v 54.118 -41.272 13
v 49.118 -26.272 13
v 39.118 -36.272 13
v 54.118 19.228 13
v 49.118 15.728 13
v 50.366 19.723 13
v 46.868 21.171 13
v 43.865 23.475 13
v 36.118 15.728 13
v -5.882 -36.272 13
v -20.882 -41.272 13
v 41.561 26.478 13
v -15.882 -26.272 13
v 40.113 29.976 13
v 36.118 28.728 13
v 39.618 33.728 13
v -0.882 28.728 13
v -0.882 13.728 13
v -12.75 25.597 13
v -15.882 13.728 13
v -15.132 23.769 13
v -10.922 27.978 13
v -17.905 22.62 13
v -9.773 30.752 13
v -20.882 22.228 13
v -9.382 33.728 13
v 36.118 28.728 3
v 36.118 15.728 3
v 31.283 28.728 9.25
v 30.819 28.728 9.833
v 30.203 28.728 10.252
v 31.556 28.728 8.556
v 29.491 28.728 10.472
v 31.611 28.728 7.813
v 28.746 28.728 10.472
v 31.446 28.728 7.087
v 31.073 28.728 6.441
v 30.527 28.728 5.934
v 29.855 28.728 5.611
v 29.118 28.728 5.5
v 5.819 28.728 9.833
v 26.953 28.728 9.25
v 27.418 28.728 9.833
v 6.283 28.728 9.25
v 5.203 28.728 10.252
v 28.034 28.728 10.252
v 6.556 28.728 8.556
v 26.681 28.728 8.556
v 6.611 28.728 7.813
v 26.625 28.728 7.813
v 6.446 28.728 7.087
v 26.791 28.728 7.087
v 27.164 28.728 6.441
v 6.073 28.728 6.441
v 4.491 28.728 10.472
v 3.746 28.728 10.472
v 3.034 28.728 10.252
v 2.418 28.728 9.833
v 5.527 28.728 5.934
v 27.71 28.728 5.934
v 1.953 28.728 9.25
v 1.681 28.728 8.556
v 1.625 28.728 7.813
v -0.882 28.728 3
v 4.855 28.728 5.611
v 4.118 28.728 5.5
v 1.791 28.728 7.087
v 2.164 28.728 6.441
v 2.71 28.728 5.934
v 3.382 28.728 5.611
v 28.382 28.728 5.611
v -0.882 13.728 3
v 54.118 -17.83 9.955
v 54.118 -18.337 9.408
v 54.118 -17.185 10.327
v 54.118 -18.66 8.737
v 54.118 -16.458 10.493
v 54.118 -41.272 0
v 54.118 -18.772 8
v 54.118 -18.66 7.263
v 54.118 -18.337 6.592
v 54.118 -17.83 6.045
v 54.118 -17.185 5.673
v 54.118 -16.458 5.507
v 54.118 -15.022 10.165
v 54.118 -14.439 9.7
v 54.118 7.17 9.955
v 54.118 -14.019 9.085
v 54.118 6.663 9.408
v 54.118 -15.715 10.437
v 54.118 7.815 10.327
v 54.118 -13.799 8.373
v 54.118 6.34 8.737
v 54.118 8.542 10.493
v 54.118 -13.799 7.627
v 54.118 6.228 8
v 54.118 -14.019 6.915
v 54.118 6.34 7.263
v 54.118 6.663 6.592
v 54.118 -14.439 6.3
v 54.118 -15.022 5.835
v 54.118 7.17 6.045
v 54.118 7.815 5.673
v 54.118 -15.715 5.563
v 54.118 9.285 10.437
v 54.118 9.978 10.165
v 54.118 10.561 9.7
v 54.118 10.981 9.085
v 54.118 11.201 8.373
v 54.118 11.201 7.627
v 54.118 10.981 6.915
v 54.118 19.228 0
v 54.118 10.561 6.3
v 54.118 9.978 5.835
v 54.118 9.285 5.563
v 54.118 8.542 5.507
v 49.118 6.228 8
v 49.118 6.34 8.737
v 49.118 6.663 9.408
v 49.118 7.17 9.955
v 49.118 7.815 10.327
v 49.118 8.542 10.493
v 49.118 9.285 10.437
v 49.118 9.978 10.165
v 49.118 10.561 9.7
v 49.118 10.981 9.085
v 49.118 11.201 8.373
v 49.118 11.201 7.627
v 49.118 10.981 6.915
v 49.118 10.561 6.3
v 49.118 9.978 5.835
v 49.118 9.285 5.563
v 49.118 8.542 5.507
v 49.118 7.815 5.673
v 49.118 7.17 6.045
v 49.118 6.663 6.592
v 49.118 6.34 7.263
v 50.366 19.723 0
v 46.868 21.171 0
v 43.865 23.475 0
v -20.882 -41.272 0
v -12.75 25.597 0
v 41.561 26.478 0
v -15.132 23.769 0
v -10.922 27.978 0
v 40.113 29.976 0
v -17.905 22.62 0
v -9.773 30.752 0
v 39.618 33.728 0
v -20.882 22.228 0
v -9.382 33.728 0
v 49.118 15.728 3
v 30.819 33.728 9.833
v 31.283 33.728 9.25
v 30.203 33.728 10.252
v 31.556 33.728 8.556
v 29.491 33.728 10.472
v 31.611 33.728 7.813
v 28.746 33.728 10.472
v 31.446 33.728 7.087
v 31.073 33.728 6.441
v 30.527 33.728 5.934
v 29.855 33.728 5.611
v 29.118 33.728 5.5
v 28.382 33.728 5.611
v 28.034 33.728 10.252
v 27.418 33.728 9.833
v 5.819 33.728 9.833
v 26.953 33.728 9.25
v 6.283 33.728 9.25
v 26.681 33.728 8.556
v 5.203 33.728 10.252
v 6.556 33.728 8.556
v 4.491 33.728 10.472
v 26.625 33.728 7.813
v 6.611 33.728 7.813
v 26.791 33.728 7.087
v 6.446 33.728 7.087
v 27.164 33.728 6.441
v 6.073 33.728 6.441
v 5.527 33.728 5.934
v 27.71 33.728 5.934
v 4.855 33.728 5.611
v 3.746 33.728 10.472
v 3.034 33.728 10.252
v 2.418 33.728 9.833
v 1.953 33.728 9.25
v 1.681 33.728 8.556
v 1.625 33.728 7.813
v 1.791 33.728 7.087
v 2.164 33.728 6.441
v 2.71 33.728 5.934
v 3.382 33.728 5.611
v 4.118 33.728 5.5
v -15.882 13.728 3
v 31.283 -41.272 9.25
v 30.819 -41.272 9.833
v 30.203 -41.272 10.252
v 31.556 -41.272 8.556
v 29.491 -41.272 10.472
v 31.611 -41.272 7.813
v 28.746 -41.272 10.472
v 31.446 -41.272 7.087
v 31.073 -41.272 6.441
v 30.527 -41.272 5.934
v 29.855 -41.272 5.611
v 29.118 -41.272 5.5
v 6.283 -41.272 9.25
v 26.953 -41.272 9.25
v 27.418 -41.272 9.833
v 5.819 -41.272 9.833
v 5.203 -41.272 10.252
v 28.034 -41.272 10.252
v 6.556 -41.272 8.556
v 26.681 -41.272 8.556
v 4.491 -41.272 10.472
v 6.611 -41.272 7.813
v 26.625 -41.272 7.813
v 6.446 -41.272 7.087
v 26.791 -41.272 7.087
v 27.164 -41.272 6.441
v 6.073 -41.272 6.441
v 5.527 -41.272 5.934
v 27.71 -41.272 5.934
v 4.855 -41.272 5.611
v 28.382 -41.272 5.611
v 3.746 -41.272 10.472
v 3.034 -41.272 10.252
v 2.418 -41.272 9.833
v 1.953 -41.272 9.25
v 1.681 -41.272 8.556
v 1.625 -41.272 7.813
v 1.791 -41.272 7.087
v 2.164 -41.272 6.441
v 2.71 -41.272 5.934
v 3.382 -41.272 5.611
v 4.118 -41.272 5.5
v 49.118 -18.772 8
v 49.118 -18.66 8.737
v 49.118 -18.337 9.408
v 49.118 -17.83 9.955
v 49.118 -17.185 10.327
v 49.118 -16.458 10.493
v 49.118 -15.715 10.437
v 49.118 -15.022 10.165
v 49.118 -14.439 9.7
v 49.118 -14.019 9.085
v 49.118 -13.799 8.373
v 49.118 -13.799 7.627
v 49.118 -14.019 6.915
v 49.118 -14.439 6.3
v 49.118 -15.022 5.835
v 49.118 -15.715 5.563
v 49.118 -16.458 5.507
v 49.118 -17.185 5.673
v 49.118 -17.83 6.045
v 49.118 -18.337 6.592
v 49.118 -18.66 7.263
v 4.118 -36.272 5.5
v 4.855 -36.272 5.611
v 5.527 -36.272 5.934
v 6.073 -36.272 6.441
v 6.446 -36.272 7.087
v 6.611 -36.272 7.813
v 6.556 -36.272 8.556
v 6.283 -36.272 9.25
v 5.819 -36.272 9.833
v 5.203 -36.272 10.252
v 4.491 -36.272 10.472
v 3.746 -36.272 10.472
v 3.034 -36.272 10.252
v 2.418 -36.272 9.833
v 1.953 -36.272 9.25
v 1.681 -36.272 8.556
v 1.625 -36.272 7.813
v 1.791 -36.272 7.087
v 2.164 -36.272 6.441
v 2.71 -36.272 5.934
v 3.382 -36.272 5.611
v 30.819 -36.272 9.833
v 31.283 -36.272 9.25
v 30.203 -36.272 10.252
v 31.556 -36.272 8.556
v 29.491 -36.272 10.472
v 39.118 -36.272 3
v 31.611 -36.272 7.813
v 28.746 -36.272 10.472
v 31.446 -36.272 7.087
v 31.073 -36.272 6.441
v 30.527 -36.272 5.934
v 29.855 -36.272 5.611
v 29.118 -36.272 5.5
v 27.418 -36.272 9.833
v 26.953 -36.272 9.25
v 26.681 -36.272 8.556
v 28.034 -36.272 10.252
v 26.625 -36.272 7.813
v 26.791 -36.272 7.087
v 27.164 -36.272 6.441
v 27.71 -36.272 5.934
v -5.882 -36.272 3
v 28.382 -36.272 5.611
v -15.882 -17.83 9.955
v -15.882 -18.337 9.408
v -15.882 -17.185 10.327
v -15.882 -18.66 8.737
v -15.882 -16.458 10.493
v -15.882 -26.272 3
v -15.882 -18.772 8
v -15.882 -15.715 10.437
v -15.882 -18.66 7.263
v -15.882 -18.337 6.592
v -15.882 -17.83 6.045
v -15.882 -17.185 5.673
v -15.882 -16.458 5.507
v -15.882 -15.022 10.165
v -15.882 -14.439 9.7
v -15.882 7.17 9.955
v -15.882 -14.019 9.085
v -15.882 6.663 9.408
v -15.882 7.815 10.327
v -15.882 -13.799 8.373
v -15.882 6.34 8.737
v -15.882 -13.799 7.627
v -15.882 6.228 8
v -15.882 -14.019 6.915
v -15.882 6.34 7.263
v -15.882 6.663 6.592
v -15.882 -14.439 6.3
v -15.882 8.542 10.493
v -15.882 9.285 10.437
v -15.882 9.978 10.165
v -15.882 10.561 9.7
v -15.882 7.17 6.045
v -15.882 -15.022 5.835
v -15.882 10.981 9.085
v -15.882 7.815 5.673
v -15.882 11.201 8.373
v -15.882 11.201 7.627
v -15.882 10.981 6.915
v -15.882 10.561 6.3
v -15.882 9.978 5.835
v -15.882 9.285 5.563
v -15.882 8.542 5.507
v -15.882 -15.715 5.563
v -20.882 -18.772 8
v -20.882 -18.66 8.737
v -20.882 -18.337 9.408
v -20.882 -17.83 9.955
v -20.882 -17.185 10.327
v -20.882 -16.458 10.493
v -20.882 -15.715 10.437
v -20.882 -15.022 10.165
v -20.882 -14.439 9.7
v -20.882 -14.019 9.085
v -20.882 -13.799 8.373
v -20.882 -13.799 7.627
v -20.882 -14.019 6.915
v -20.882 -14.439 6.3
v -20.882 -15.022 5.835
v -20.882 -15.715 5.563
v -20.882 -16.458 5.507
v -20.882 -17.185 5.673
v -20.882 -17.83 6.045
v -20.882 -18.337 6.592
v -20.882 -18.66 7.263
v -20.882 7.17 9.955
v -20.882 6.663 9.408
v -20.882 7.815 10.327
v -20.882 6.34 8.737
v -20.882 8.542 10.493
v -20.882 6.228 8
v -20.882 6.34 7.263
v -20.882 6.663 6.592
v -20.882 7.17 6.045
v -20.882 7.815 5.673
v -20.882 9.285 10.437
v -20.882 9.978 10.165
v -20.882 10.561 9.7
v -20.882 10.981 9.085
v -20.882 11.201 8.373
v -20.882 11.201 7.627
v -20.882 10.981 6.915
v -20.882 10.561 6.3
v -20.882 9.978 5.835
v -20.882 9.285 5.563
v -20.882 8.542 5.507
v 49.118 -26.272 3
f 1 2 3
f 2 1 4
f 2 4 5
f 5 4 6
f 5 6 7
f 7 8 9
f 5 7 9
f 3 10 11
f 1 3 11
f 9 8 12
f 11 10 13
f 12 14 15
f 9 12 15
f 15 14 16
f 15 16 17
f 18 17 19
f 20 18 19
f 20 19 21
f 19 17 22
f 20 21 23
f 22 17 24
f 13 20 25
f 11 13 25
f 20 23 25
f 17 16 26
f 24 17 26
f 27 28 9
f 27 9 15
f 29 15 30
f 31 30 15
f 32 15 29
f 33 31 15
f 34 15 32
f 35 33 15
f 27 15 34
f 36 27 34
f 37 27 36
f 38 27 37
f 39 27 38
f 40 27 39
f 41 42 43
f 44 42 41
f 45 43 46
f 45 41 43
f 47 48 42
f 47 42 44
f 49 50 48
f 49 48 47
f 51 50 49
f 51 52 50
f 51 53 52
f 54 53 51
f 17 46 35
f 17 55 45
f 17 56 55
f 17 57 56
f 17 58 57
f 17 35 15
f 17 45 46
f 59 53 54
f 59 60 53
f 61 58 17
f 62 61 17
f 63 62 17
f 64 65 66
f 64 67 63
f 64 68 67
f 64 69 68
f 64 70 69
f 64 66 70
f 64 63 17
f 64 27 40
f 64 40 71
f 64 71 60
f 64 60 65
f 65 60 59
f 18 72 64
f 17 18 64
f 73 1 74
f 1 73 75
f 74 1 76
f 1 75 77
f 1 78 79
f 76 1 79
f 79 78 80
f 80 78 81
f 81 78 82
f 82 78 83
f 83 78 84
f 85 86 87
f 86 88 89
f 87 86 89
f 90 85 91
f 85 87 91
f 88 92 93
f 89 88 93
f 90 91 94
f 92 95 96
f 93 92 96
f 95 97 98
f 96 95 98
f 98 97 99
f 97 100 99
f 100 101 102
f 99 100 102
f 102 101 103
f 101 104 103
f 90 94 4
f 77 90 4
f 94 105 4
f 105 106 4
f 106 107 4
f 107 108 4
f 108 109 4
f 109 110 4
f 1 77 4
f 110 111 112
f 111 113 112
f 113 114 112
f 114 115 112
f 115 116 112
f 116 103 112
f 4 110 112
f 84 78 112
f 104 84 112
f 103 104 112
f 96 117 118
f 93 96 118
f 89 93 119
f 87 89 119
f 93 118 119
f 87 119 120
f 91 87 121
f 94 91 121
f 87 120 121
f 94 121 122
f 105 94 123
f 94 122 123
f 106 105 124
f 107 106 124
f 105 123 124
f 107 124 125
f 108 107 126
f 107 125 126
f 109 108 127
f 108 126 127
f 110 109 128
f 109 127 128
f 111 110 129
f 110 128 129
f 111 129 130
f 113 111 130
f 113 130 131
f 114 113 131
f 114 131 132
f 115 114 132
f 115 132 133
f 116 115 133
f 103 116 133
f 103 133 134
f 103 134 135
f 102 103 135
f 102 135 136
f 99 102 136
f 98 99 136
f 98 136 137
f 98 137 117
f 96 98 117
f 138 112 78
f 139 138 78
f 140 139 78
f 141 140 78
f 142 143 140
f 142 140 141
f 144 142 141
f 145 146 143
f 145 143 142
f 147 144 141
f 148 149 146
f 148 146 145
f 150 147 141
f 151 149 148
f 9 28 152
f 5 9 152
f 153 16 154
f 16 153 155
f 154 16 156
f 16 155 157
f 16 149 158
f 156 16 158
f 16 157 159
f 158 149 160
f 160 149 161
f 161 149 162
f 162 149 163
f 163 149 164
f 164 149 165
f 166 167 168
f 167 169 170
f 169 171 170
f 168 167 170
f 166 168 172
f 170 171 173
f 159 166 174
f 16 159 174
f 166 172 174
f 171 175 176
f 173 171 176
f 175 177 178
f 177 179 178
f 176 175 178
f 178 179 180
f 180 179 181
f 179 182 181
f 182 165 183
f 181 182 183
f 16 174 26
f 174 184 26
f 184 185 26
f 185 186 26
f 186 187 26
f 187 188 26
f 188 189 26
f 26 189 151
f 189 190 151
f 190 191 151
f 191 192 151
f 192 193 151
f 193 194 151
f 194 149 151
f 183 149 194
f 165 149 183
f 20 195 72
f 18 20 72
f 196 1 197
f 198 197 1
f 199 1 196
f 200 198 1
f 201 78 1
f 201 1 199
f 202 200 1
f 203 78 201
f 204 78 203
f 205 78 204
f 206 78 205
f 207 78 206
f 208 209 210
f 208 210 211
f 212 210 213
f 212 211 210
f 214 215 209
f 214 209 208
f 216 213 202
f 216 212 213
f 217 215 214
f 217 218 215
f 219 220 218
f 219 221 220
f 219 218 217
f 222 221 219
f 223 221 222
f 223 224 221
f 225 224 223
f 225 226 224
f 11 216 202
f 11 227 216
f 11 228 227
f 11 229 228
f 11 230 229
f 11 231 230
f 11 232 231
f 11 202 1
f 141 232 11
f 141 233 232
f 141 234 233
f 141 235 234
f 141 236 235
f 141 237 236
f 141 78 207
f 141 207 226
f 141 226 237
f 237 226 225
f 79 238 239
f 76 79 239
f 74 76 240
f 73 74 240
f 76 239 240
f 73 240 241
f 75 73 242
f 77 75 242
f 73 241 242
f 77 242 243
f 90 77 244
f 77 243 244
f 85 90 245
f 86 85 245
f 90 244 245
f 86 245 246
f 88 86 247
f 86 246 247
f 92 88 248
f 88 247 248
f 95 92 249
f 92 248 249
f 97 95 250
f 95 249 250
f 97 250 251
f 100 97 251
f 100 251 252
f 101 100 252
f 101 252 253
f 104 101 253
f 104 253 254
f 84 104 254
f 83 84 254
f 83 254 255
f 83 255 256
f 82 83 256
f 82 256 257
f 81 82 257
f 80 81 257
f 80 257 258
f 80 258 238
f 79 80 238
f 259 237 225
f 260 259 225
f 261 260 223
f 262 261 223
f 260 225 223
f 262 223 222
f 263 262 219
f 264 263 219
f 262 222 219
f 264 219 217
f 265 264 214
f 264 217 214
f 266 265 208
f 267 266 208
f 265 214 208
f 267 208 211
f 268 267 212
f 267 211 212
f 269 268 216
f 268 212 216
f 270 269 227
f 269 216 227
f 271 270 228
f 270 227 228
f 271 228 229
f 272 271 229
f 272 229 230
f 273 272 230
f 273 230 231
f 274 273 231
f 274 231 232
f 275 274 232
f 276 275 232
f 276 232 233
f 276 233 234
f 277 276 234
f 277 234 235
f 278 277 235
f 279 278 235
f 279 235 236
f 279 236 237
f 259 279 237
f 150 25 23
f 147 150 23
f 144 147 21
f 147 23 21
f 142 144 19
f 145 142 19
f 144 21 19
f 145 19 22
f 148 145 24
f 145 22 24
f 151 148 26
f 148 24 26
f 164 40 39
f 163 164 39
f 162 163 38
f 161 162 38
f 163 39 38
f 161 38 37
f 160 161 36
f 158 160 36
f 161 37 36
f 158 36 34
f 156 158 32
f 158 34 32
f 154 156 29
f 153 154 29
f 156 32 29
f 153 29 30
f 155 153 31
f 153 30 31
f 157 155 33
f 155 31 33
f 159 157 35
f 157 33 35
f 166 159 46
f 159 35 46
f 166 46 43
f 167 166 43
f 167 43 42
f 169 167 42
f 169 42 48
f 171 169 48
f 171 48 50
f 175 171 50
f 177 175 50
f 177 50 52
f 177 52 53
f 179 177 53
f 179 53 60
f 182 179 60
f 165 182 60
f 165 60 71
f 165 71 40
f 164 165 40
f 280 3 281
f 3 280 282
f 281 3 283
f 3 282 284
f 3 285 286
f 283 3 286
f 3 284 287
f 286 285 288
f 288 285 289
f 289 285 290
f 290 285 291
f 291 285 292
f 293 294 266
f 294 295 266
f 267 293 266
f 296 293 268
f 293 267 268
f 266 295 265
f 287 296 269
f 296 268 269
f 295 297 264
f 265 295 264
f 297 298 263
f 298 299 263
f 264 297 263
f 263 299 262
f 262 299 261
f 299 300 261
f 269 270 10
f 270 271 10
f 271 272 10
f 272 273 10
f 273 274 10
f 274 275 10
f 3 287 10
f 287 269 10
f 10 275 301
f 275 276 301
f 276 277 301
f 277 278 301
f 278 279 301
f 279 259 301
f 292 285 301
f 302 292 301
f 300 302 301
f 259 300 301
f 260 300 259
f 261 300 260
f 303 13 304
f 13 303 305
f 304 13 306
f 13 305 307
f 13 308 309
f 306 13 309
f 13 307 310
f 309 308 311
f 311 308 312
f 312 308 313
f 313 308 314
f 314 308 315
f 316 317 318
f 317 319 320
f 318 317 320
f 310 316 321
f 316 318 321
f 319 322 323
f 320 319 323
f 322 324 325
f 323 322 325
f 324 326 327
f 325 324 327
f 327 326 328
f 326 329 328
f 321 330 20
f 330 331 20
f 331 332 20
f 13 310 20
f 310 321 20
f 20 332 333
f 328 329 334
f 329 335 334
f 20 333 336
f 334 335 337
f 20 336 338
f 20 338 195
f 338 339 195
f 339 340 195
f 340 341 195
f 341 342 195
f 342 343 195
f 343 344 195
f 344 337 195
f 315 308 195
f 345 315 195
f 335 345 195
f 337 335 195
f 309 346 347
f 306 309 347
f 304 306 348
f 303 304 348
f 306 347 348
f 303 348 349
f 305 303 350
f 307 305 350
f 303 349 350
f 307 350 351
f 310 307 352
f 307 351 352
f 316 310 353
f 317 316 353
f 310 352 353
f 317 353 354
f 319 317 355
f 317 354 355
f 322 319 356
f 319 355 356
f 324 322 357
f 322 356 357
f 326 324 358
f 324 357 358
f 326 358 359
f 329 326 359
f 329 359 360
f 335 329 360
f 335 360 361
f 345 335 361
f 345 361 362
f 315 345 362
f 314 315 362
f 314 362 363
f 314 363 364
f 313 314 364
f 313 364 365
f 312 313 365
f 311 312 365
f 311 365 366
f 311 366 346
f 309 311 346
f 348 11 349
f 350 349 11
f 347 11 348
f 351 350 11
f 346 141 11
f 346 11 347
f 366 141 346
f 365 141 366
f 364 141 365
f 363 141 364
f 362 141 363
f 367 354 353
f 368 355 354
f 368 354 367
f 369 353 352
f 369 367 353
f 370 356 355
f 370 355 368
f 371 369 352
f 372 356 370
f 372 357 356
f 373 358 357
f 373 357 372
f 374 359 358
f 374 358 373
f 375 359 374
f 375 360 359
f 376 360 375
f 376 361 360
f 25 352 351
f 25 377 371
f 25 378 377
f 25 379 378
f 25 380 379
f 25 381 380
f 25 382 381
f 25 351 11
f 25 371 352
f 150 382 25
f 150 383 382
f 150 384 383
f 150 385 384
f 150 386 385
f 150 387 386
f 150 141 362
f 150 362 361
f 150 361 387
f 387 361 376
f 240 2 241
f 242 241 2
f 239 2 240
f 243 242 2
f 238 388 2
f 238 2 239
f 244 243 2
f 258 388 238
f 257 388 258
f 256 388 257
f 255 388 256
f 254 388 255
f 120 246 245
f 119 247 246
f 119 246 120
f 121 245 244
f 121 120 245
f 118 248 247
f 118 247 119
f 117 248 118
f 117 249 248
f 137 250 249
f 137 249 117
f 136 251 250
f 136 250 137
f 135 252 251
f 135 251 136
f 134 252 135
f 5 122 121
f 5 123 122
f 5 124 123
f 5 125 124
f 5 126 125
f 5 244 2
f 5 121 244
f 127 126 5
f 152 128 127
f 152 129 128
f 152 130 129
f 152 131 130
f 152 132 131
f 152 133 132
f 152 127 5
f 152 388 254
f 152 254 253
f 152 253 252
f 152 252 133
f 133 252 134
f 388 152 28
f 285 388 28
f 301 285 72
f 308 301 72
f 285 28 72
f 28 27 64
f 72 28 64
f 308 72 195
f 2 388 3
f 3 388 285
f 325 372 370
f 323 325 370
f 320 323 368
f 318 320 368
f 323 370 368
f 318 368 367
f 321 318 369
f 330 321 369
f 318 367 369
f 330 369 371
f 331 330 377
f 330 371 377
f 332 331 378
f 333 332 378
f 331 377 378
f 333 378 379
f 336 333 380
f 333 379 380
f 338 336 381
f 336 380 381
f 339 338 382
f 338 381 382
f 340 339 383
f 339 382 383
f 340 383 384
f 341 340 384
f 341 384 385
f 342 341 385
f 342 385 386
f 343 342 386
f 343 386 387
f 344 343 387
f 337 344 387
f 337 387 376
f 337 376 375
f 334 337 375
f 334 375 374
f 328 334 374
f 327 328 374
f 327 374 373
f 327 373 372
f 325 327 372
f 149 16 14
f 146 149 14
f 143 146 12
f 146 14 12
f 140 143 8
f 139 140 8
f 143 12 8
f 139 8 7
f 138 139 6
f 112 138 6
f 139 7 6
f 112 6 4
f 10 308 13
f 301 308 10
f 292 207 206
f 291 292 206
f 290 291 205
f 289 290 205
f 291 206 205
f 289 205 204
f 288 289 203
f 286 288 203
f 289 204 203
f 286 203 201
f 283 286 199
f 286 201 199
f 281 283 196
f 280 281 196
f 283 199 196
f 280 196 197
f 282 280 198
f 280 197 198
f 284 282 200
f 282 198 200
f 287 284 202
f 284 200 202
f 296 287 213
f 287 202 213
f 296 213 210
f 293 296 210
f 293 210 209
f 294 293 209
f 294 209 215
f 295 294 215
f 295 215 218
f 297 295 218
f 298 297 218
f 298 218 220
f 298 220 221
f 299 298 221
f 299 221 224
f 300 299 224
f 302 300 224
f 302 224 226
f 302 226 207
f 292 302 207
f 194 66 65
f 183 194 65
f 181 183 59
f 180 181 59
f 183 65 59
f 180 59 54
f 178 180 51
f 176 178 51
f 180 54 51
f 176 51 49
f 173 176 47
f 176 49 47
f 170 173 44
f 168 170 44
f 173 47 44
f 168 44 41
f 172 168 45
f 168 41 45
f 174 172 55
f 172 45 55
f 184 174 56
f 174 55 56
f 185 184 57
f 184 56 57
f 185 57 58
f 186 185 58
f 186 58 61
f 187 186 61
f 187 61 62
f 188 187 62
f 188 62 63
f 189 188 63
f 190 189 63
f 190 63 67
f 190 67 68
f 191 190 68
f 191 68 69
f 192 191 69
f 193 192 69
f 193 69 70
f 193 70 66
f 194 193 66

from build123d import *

# Parameters (mm, degrees)
BOSS_EXTRU_1_DEPTH        = 13
COQUE1_T                  = -5
COQUE1_THICKNESS_2_FACE_W = 65
COQUE1_THICKNESS_2_FACE_H = 65
COQUE1_THICKNESS_2_DEPTH  = 2
ENL_V_MAT_EXTRU_1_REACH   = 88.587
ESQUISSE2_R               = 2.5
ENL_V_MAT_EXTRU_2_REACH   = 95.396
ESQUISSE3_R               = 2.5
ESQUISSE4_W               = 18
ESQUISSE4_H               = 18
ESQUISSE4_W_2             = 15
ESQUISSE4_H_2             = 15
BOSS_EXTRU_2_DEPTH        = 10
ESQUISSE5_R               = 11.5
ESQUISSE5_R_2             = 14.5
ENL_V_MAT_EXTRU_3_DEPTH   = 13


with BuildPart() as part:
    # Esquisse1 → Boss.-Extru.1 (new body)
    with BuildSketch(Plane.XY):
        Polygon((44.118436308, 33.728448276), (54.118436308, 33.728448276), (54.118436308, 23.728448276), (54.118436308, -41.271551724), (-20.881563692, -41.271551724), (-20.881563692, 33.728448276), align=None)
    extrude(amount=BOSS_EXTRU_1_DEPTH)

    # Coque1
    coque1_openings = [part.faces().sort_by_distance(p)[0] for p in [
        (16.618436308, -3.771551724, 13),
    ]]
    offset(amount=COQUE1_T, openings=coque1_openings, kind=Kind.INTERSECTION)

    # Coque1 thickness 2 face (on inner face of the shell) → Coque1 thickness 2 (cut)
    with BuildSketch(Plane(origin=(16.618436308, -3.771551724, 5), x_dir=(-1, 0, 0), z_dir=(0, 0, -1))):
        Rectangle(COQUE1_THICKNESS_2_FACE_W, COQUE1_THICKNESS_2_FACE_H)
    extrude(amount=COQUE1_THICKNESS_2_DEPTH, mode=Mode.SUBTRACT)

    # Enlèv. mat.-Extru.1: up to this face of the body (flat: up to its plane)
    enl_v_mat_extru_1_end = Plane(part.part.faces().sort_by_distance((54.118436308, -3.771551724, 6.5))[0])
    # Esquisse2 → Enlèv. mat.-Extru.1 (cut, up to the picked face)
    with BuildSketch(Plane.ZY.offset(20.881563692), mode=Mode.PRIVATE) as enl_v_mat_extru_1_sk1:
        with Locations(Location((8, -16.271551724, 0), (0, 0, 270))):
            Circle(ESQUISSE2_R)
    enl_v_mat_extru_1_tool1 = split(extrude(enl_v_mat_extru_1_sk1.sketch, amount=-ENL_V_MAT_EXTRU_1_REACH, mode=Mode.PRIVATE), bisect_by=enl_v_mat_extru_1_end, keep=Keep.BOTH, mode=Mode.PRIVATE)
    # Esquisse2 → Enlèv. mat.-Extru.1 (cut, up to the picked face)
    with BuildSketch(Plane.ZY.offset(20.881563692), mode=Mode.PRIVATE) as enl_v_mat_extru_1_sk2:
        with Locations(Location((8, 8.728448276, 0), (0, 0, 270))):
            Circle(ESQUISSE2_R)
    enl_v_mat_extru_1_tool2 = split(extrude(enl_v_mat_extru_1_sk2.sketch, amount=-ENL_V_MAT_EXTRU_1_REACH, mode=Mode.PRIVATE), bisect_by=enl_v_mat_extru_1_end, keep=Keep.BOTH, mode=Mode.PRIVATE)
    add(enl_v_mat_extru_1_tool1.solids().sort_by(Axis((-20.881564, -16.271552, 8), (1, 0, 0)))[0], mode=Mode.SUBTRACT)
    add(enl_v_mat_extru_1_tool2.solids().sort_by(Axis((-20.881564, 8.728448, 8), (1, 0, 0)))[0], mode=Mode.SUBTRACT)

    # Enlèv. mat.-Extru.2: up to this face of the body (flat: up to its plane)
    enl_v_mat_extru_2_end = Plane(part.part.faces().sort_by_distance((16.618436308, 33.728448276, 6.5))[0])
    # Esquisse3 → Enlèv. mat.-Extru.2 (cut, up to the picked face)
    with BuildSketch(Plane.XZ.offset(41.271551724), mode=Mode.PRIVATE) as enl_v_mat_extru_2_sk1:
        with Locations(Location((4.118436308, 8, 0), (0, 0, 270))):
            Circle(ESQUISSE3_R)
    enl_v_mat_extru_2_tool1 = split(extrude(enl_v_mat_extru_2_sk1.sketch, amount=-ENL_V_MAT_EXTRU_2_REACH, mode=Mode.PRIVATE), bisect_by=enl_v_mat_extru_2_end, keep=Keep.BOTH, mode=Mode.PRIVATE)
    # Esquisse3 → Enlèv. mat.-Extru.2 (cut, up to the picked face)
    with BuildSketch(Plane.XZ.offset(41.271551724), mode=Mode.PRIVATE) as enl_v_mat_extru_2_sk2:
        with Locations(Location((29.118436308, 8, 0), (0, 0, 270))):
            Circle(ESQUISSE3_R)
    enl_v_mat_extru_2_tool2 = split(extrude(enl_v_mat_extru_2_sk2.sketch, amount=-ENL_V_MAT_EXTRU_2_REACH, mode=Mode.PRIVATE), bisect_by=enl_v_mat_extru_2_end, keep=Keep.BOTH, mode=Mode.PRIVATE)
    add(enl_v_mat_extru_2_tool1.solids().sort_by(Axis((4.118436, -41.271552, 8), (0, 1, 0)))[0], mode=Mode.SUBTRACT)
    add(enl_v_mat_extru_2_tool2.solids().sort_by(Axis((29.118436, -41.271552, 8), (0, 1, 0)))[0], mode=Mode.SUBTRACT)

    # Esquisse4 → Boss.-Extru.2 (add)
    with BuildSketch(Plane.XY.offset(3)):
        Polygon((-15.881563692, -26.271551724), (-5.881563692, -36.271551724), (-15.881563692, -36.271551724), align=None)
        with Locations((45.118436308, 24.728448276)):
            Rectangle(ESQUISSE4_W, ESQUISSE4_H)
        Polygon((49.118436308, -36.271551724), (49.118436308, -26.271551724), (39.118436308, -36.271551724), align=None)
        with Locations((-8.381563692, 21.228448276)):
            Rectangle(ESQUISSE4_W_2, ESQUISSE4_H_2)
    extrude(amount=BOSS_EXTRU_2_DEPTH)

    # Esquisse5 → Enlèv. mat.-Extru.3 (cut)
    with BuildSketch(Plane.XY.offset(13)):
        with Locations((-20.881563692, 33.728448276)):
            Circle(ESQUISSE5_R)
        with Locations((54.118436308, 33.728448276)):
            Circle(ESQUISSE5_R_2)
    extrude(amount=-ENL_V_MAT_EXTRU_3_DEPTH, mode=Mode.SUBTRACT)


solid = part.part
